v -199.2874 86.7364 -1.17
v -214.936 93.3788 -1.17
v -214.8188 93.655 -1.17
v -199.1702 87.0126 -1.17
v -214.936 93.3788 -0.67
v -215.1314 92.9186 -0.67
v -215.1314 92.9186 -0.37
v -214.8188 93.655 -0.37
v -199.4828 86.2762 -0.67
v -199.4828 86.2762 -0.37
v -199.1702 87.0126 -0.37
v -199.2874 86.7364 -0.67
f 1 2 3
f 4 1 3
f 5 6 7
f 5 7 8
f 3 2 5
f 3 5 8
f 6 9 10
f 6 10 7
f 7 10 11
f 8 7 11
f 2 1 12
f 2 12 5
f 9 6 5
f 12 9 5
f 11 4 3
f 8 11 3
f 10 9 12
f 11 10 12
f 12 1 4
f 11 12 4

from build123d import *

# Parameters (mm, degrees)
BOX117_W               = 0.8
BOX117_H               = 17
BOX117_DEPTH           = 0.8
BOX118_W               = 0.8
BOX118_H               = 17
BOX118_DEPTH           = 0.8
CUT062_PLACEMENT_ANGLE = 67


with BuildPart() as cubo117:
    # Box117 → Box117 (new body)
    with BuildSketch(Plane.XY):
        with Locations((0.4, 8.5)):
            Rectangle(BOX117_W, BOX117_H)
    extrude(amount=BOX117_DEPTH)


with BuildPart() as perfil_l_2da_cara004:
    # Box118 → Box118 (new body)
    with BuildSketch(Plane(origin=(0.3, 0, 0.3), x_dir=(1, 0, 0), z_dir=(0, 0, 1))):
        with Locations((0.4, 8.5)):
            Rectangle(BOX118_W, BOX118_H)
    extrude(amount=BOX118_DEPTH)

    # Cut062: cut Cubo117
    add(cubo117.part, mode=Mode.SUBTRACT)


with BuildPart() as perfil_l_2da_cara004_1:
    # Cut062 placement: moved
    add(perfil_l_2da_cara004.part.moved(Location((-199.6, 86, -1.47))).rotate(Axis((-199.6, 86, -1.47), (0, 0, 1)), CUT062_PLACEMENT_ANGLE))


solid = perfil_l_2da_cara004_1.part
